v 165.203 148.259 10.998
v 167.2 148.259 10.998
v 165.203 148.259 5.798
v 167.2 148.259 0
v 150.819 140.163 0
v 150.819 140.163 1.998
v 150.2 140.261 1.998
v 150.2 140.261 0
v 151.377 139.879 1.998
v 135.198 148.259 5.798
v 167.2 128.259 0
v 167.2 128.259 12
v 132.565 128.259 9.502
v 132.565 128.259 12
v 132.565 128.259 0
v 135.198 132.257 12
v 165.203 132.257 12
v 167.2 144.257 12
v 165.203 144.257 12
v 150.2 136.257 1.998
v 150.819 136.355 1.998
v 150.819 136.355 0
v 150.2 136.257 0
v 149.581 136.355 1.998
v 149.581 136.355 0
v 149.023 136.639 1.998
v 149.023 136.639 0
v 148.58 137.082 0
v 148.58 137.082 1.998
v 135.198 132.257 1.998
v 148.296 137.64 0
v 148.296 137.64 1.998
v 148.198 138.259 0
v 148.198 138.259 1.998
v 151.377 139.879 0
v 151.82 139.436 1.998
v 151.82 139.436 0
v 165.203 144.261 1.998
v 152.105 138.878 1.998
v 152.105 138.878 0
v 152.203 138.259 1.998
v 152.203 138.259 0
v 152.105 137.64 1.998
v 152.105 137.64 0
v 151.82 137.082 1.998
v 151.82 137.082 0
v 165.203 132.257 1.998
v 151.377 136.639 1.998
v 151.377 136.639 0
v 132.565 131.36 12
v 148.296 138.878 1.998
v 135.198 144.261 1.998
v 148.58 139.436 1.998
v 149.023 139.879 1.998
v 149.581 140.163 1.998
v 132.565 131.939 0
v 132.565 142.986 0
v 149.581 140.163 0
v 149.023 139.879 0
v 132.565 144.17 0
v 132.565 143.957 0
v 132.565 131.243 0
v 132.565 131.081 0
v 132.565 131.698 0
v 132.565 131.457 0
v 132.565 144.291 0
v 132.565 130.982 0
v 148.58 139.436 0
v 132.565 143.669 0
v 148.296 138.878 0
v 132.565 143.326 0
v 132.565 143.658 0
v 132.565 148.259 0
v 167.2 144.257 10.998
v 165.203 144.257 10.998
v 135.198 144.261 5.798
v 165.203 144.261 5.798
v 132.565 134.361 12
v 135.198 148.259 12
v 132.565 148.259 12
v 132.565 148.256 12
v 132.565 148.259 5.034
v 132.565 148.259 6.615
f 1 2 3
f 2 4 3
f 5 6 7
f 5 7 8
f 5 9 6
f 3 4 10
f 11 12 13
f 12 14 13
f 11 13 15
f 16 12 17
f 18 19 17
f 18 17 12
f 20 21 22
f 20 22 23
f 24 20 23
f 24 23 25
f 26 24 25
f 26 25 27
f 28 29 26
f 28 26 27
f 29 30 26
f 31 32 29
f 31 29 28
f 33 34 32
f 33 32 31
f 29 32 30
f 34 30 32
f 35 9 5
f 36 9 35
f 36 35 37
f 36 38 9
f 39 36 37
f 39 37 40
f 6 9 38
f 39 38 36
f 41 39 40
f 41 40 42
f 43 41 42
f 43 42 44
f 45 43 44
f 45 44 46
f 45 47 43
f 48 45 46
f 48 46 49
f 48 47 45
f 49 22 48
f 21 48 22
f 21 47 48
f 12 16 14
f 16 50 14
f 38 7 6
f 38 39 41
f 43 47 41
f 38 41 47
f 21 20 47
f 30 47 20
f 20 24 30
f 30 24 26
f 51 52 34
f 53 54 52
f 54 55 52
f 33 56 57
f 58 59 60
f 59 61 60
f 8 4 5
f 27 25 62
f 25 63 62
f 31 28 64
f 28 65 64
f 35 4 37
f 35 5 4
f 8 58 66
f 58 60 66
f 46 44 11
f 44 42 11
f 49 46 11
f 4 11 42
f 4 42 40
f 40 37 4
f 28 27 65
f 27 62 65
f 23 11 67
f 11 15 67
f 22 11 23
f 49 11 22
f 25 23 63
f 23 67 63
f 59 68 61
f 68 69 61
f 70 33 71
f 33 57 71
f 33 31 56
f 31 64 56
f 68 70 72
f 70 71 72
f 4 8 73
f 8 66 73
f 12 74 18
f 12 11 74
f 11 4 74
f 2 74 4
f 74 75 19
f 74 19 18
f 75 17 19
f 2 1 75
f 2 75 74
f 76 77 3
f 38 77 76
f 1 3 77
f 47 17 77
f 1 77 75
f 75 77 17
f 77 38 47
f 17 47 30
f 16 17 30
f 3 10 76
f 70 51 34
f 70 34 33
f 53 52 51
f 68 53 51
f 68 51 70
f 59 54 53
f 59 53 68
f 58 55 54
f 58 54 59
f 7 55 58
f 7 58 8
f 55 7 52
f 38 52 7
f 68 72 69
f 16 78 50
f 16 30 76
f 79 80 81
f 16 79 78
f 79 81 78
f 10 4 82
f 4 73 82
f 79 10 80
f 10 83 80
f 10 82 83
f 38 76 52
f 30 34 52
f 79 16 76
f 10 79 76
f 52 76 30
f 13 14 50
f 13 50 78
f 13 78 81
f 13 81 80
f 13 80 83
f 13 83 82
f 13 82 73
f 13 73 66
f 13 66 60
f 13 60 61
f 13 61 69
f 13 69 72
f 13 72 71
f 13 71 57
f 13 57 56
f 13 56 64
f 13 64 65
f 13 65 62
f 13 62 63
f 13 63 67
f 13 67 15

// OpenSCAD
// Generated from geometric mesh data for hotbed_foot.stl.
// This file is self-contained and does not import or reference the source STL.
// Source mesh: 498 vertices, 166 triangular faces.

module hotbed_foot_v1() {
  polyhedron(
    points = [
      [165.20300293, 148.25900269, 10.9980011],
      [167.20001221, 148.25900269, 10.9980011],
      [165.20300293, 148.25900269, 5.79800034],
      [167.20001221, 148.25900269, 10.9980011],
      [167.20001221, 148.25900269, 0],
      [165.20300293, 148.25900269, 5.79800034],
      [150.81900024, 140.16299438, 0],
      [150.81900024, 140.16299438, 1.9980011],
      [150.20001221, 140.26100159, 1.9980011],
      [150.81900024, 140.16299438, 0],
      [150.20001221, 140.26100159, 1.9980011],
      [150.20001221, 140.26100159, 0],
      [150.81900024, 140.16299438, 0],
      [151.3769989, 139.8789978, 1.9980011],
      [150.81900024, 140.16299438, 1.9980011],
      [165.20300293, 148.25900269, 5.79800034],
      [167.20001221, 148.25900269, 0],
      [135.19799805, 148.25900269, 5.79800034],
      [167.20001221, 128.25900269, 0],
      [167.20001221, 128.25900269, 12],
      [132.5645752, 128.25900269, 9.50236511],
      [167.20001221, 128.25900269, 12],
      [132.5645752, 128.25900269, 12],
      [132.5645752, 128.25900269, 9.50236511],
      [167.20001221, 128.25900269, 0],
      [132.5645752, 128.25900269, 9.50236511],
      [132.5645752, 128.25900269, 0],
      [135.19799805, 132.25700378, 12],
      [167.20001221, 128.25900269, 12],
      [165.20300293, 132.25700378, 12],
      [167.20001221, 144.25700378, 12],
      [165.20300293, 144.25700378, 12],
      [165.20300293, 132.25700378, 12],
      [167.20001221, 144.25700378, 12],
      [165.20300293, 132.25700378, 12],
      [167.20001221, 128.25900269, 12],
      [150.20001221, 136.25700378, 1.9980011],
      [150.81900024, 136.35499573, 1.9980011],
      [150.81900024, 136.35499573, 0],
      [150.20001221, 136.25700378, 1.9980011],
      [150.81900024, 136.35499573, 0],
      [150.20001221, 136.25700378, 0],
      [149.58099365, 136.35499573, 1.9980011],
      [150.20001221, 136.25700378, 1.9980011],
      [150.20001221, 136.25700378, 0],
      [149.58099365, 136.35499573, 1.9980011],
      [150.20001221, 136.25700378, 0],
      [149.58099365, 136.35499573, 0],
      [149.022995, 136.63900757, 1.9980011],
      [149.58099365, 136.35499573, 1.9980011],
      [149.58099365, 136.35499573, 0],
      [149.022995, 136.63900757, 1.9980011],
      [149.58099365, 136.35499573, 0],
      [149.022995, 136.63900757, 0],
      [148.58000183, 137.08200073, 0],
      [148.58000183, 137.08200073, 1.9980011],
      [149.022995, 136.63900757, 1.9980011],
      [148.58000183, 137.08200073, 0],
      [149.022995, 136.63900757, 1.9980011],
      [149.022995, 136.63900757, 0],
      [148.58000183, 137.08200073, 1.9980011],
      [135.19799805, 132.25700378, 1.9980011],
      [149.022995, 136.63900757, 1.9980011],
      [148.29600525, 137.63999939, 0],
      [148.29600525, 137.63999939, 1.9980011],
      [148.58000183, 137.08200073, 1.9980011],
      [148.29600525, 137.63999939, 0],
      [148.58000183, 137.08200073, 1.9980011],
      [148.58000183, 137.08200073, 0],
      [148.19799805, 138.25900269, 0],
      [148.19799805, 138.25900269, 1.9980011],
      [148.29600525, 137.63999939, 1.9980011],
      [148.19799805, 138.25900269, 0],
      [148.29600525, 137.63999939, 1.9980011],
      [148.29600525, 137.63999939, 0],
      [148.58000183, 137.08200073, 1.9980011],
      [148.29600525, 137.63999939, 1.9980011],
      [135.19799805, 132.25700378, 1.9980011],
      [148.19799805, 138.25900269, 1.9980011],
      [135.19799805, 132.25700378, 1.9980011],
      [148.29600525, 137.63999939, 1.9980011],
      [151.3769989, 139.8789978, 0],
      [151.3769989, 139.8789978, 1.9980011],
      [150.81900024, 140.16299438, 0],
      [151.82000732, 139.43600464, 1.9980011],
      [151.3769989, 139.8789978, 1.9980011],
      [151.3769989, 139.8789978, 0],
      [151.82000732, 139.43600464, 1.9980011],
      [151.3769989, 139.8789978, 0],
      [151.82000732, 139.43600464, 0],
      [151.82000732, 139.43600464, 1.9980011],
      [165.20300293, 144.26100159, 1.9980011],
      [151.3769989, 139.8789978, 1.9980011],
      [152.10501099, 138.87799072, 1.9980011],
      [151.82000732, 139.43600464, 1.9980011],
      [151.82000732, 139.43600464, 0],
      [152.10501099, 138.87799072, 1.9980011],
      [151.82000732, 139.43600464, 0],
      [152.10501099, 138.87799072, 0],
      [150.81900024, 140.16299438, 1.9980011],
      [151.3769989, 139.8789978, 1.9980011],
      [165.20300293, 144.26100159, 1.9980011],
      [152.10501099, 138.87799072, 1.9980011],
      [165.20300293, 144.26100159, 1.9980011],
      [151.82000732, 139.43600464, 1.9980011],
      [152.20300293, 138.25900269, 1.9980011],
      [152.10501099, 138.87799072, 1.9980011],
      [152.10501099, 138.87799072, 0],
      [152.20300293, 138.25900269, 1.9980011],
      [152.10501099, 138.87799072, 0],
      [152.20300293, 138.25900269, 0],
      [152.10501099, 137.63999939, 1.9980011],
      [152.20300293, 138.25900269, 1.9980011],
      [152.20300293, 138.25900269, 0],
      [152.10501099, 137.63999939, 1.9980011],
      [152.20300293, 138.25900269, 0],
      [152.10501099, 137.63999939, 0],
      [151.82000732, 137.08200073, 1.9980011],
      [152.10501099, 137.63999939, 1.9980011],
      [152.10501099, 137.63999939, 0],
      [151.82000732, 137.08200073, 1.9980011],
      [152.10501099, 137.63999939, 0],
      [151.82000732, 137.08200073, 0],
      [151.82000732, 137.08200073, 1.9980011],
      [165.20300293, 132.25700378, 1.9980011],
      [152.10501099, 137.63999939, 1.9980011],
      [151.3769989, 136.63900757, 1.9980011],
      [151.82000732, 137.08200073, 1.9980011],
      [151.82000732, 137.08200073, 0],
      [151.3769989, 136.63900757, 1.9980011],
      [151.82000732, 137.08200073, 0],
      [151.3769989, 136.63900757, 0],
      [151.3769989, 136.63900757, 1.9980011],
      [165.20300293, 132.25700378, 1.9980011],
      [151.82000732, 137.08200073, 1.9980011],
      [151.3769989, 136.63900757, 0],
      [150.81900024, 136.35499573, 0],
      [151.3769989, 136.63900757, 1.9980011],
      [150.81900024, 136.35499573, 1.9980011],
      [151.3769989, 136.63900757, 1.9980011],
      [150.81900024, 136.35499573, 0],
      [150.81900024, 136.35499573, 1.9980011],
      [165.20300293, 132.25700378, 1.9980011],
      [151.3769989, 136.63900757, 1.9980011],
      [167.20001221, 128.25900269, 12],
      [135.19799805, 132.25700378, 12],
      [132.5645752, 128.25900269, 12],
      [135.19799805, 132.25700378, 12],
      [132.5645752, 131.35998535, 12],
      [132.5645752, 128.25900269, 12],
      [165.20300293, 144.26100159, 1.9980011],
      [150.20001221, 140.26100159, 1.9980011],
      [150.81900024, 140.16299438, 1.9980011],
      [165.20300293, 144.26100159, 1.9980011],
      [152.10501099, 138.87799072, 1.9980011],
      [152.20300293, 138.25900269, 1.9980011],
      [152.10501099, 137.63999939, 1.9980011],
      [165.20300293, 132.25700378, 1.9980011],
      [152.20300293, 138.25900269, 1.9980011],
      [165.20300293, 144.26100159, 1.9980011],
      [152.20300293, 138.25900269, 1.9980011],
      [165.20300293, 132.25700378, 1.9980011],
      [150.81900024, 136.35499573, 1.9980011],
      [150.20001221, 136.25700378, 1.9980011],
      [165.20300293, 132.25700378, 1.9980011],
      [135.19799805, 132.25700378, 1.9980011],
      [165.20300293, 132.25700378, 1.9980011],
      [150.20001221, 136.25700378, 1.9980011],
      [150.20001221, 136.25700378, 1.9980011],
      [149.58099365, 136.35499573, 1.9980011],
      [135.19799805, 132.25700378, 1.9980011],
      [135.19799805, 132.25700378, 1.9980011],
      [149.58099365, 136.35499573, 1.9980011],
      [149.022995, 136.63900757, 1.9980011],
      [148.29600525, 138.87799072, 1.9980011],
      [135.19799805, 144.26100159, 1.9980011],
      [148.19799805, 138.25900269, 1.9980011],
      [148.58000183, 139.43600464, 1.9980011],
      [149.022995, 139.8789978, 1.9980011],
      [135.19799805, 144.26100159, 1.9980011],
      [149.022995, 139.8789978, 1.9980011],
      [149.58099365, 140.16299438, 1.9980011],
      [135.19799805, 144.26100159, 1.9980011],
      [148.19799805, 138.25900269, 0],
      [132.5645752, 131.93917847, 0],
      [132.5645752, 142.98579407, 0],
      [149.58099365, 140.16299438, 0],
      [149.022995, 139.8789978, 0],
      [132.5645752, 144.17001343, 0],
      [149.022995, 139.8789978, 0],
      [132.5645752, 143.95674133, 0],
      [132.5645752, 144.17001343, 0],
      [150.20001221, 140.26100159, 0],
      [167.20001221, 148.25900269, 0],
      [150.81900024, 140.16299438, 0],
      [149.022995, 136.63900757, 0],
      [149.58099365, 136.35499573, 0],
      [132.5645752, 131.24345398, 0],
      [149.58099365, 136.35499573, 0],
      [132.5645752, 131.08071899, 0],
      [132.5645752, 131.24345398, 0],
      [148.29600525, 137.63999939, 0],
      [148.58000183, 137.08200073, 0],
      [132.5645752, 131.69775391, 0],
      [148.58000183, 137.08200073, 0],
      [132.5645752, 131.45663452, 0],
      [132.5645752, 131.69775391, 0],
      [151.3769989, 139.8789978, 0],
      [167.20001221, 148.25900269, 0],
      [151.82000732, 139.43600464, 0],
      [151.3769989, 139.8789978, 0],
      [150.81900024, 140.16299438, 0],
      [167.20001221, 148.25900269, 0],
      [150.20001221, 140.26100159, 0],
      [149.58099365, 140.16299438, 0],
      [132.5645752, 144.29093933, 0],
      [149.58099365, 140.16299438, 0],
      [132.5645752, 144.17001343, 0],
      [132.5645752, 144.29093933, 0],
      [151.82000732, 137.08200073, 0],
      [152.10501099, 137.63999939, 0],
      [167.20001221, 128.25900269, 0],
      [152.10501099, 137.63999939, 0],
      [152.20300293, 138.25900269, 0],
      [167.20001221, 128.25900269, 0],
      [151.3769989, 136.63900757, 0],
      [151.82000732, 137.08200073, 0],
      [167.20001221, 128.25900269, 0],
      [167.20001221, 148.25900269, 0],
      [167.20001221, 128.25900269, 0],
      [152.20300293, 138.25900269, 0],
      [167.20001221, 148.25900269, 0],
      [152.20300293, 138.25900269, 0],
      [152.10501099, 138.87799072, 0],
      [152.10501099, 138.87799072, 0],
      [151.82000732, 139.43600464, 0],
      [167.20001221, 148.25900269, 0],
      [148.58000183, 137.08200073, 0],
      [149.022995, 136.63900757, 0],
      [132.5645752, 131.45663452, 0],
      [149.022995, 136.63900757, 0],
      [132.5645752, 131.24345398, 0],
      [132.5645752, 131.45663452, 0],
      [150.20001221, 136.25700378, 0],
      [167.20001221, 128.25900269, 0],
      [132.5645752, 130.98202515, 0],
      [167.20001221, 128.25900269, 0],
      [132.5645752, 128.25900269, 0],
      [132.5645752, 130.98202515, 0],
      [150.81900024, 136.35499573, 0],
      [167.20001221, 128.25900269, 0],
      [150.20001221, 136.25700378, 0],
      [151.3769989, 136.63900757, 0],
      [167.20001221, 128.25900269, 0],
      [150.81900024, 136.35499573, 0],
      [149.58099365, 136.35499573, 0],
      [150.20001221, 136.25700378, 0],
      [132.5645752, 131.08071899, 0],
      [150.20001221, 136.25700378, 0],
      [132.5645752, 130.98202515, 0],
      [132.5645752, 131.08071899, 0],
      [149.022995, 139.8789978, 0],
      [148.58000183, 139.43600464, 0],
      [132.5645752, 143.95674133, 0],
      [148.58000183, 139.43600464, 0],
      [132.5645752, 143.66918945, 0],
      [132.5645752, 143.95674133, 0],
      [148.29600525, 138.87799072, 0],
      [148.19799805, 138.25900269, 0],
      [132.5645752, 143.32611084, 0],
      [148.19799805, 138.25900269, 0],
      [132.5645752, 142.98579407, 0],
      [132.5645752, 143.32611084, 0],
      [148.19799805, 138.25900269, 0],
      [148.29600525, 137.63999939, 0],
      [132.5645752, 131.93917847, 0],
      [148.29600525, 137.63999939, 0],
      [132.5645752, 131.69775391, 0],
      [132.5645752, 131.93917847, 0],
      [148.58000183, 139.43600464, 0],
      [148.29600525, 138.87799072, 0],
      [132.5645752, 143.65815735, 0],
      [148.29600525, 138.87799072, 0],
      [132.5645752, 143.32611084, 0],
      [132.5645752, 143.65815735, 0],
      [167.20001221, 148.25900269, 0],
      [150.20001221, 140.26100159, 0],
      [132.5645752, 148.25900269, 0],
      [150.20001221, 140.26100159, 0],
      [132.5645752, 144.29093933, 0],
      [132.5645752, 148.25900269, 0],
      [167.20001221, 128.25900269, 12],
      [167.20001221, 144.25700378, 10.9980011],
      [167.20001221, 144.25700378, 12],
      [167.20001221, 128.25900269, 12],
      [167.20001221, 128.25900269, 0],
      [167.20001221, 144.25700378, 10.9980011],
      [167.20001221, 128.25900269, 0],
      [167.20001221, 148.25900269, 0],
      [167.20001221, 144.25700378, 10.9980011],
      [167.20001221, 148.25900269, 10.9980011],
      [167.20001221, 144.25700378, 10.9980011],
      [167.20001221, 148.25900269, 0],
      [167.20001221, 144.25700378, 10.9980011],
      [165.20300293, 144.25700378, 10.9980011],
      [165.20300293, 144.25700378, 12],
      [167.20001221, 144.25700378, 10.9980011],
      [165.20300293, 144.25700378, 12],
      [167.20001221, 144.25700378, 12],
      [165.20300293, 144.25700378, 10.9980011],
      [165.20300293, 132.25700378, 12],
      [165.20300293, 144.25700378, 12],
      [167.20001221, 148.25900269, 10.9980011],
      [165.20300293, 148.25900269, 10.9980011],
      [165.20300293, 144.25700378, 10.9980011],
      [167.20001221, 148.25900269, 10.9980011],
      [165.20300293, 144.25700378, 10.9980011],
      [167.20001221, 144.25700378, 10.9980011],
      [135.19799805, 144.26100159, 5.79800034],
      [165.20300293, 144.26100159, 5.79800034],
      [165.20300293, 148.25900269, 5.79800034],
      [165.20300293, 144.26100159, 1.9980011],
      [165.20300293, 144.26100159, 5.79800034],
      [135.19799805, 144.26100159, 5.79800034],
      [165.20300293, 148.25900269, 10.9980011],
      [165.20300293, 148.25900269, 5.79800034],
      [165.20300293, 144.26100159, 5.79800034],
      [165.20300293, 132.25700378, 1.9980011],
      [165.20300293, 132.25700378, 12],
      [165.20300293, 144.26100159, 5.79800034],
      [165.20300293, 148.25900269, 10.9980011],
      [165.20300293, 144.26100159, 5.79800034],
      [165.20300293, 144.25700378, 10.9980011],
      [165.20300293, 144.25700378, 10.9980011],
      [165.20300293, 144.26100159, 5.79800034],
      [165.20300293, 132.25700378, 12],
      [165.20300293, 144.26100159, 5.79800034],
      [165.20300293, 144.26100159, 1.9980011],
      [165.20300293, 132.25700378, 1.9980011],
      [165.20300293, 132.25700378, 12],
      [165.20300293, 132.25700378, 1.9980011],
      [135.19799805, 132.25700378, 1.9980011],
      [135.19799805, 132.25700378, 12],
      [165.20300293, 132.25700378, 12],
      [135.19799805, 132.25700378, 1.9980011],
      [165.20300293, 148.25900269, 5.79800034],
      [135.19799805, 148.25900269, 5.79800034],
      [135.19799805, 144.26100159, 5.79800034],
      [148.29600525, 138.87799072, 0],
      [148.29600525, 138.87799072, 1.9980011],
      [148.19799805, 138.25900269, 1.9980011],
      [148.29600525, 138.87799072, 0],
      [148.19799805, 138.25900269, 1.9980011],
      [148.19799805, 138.25900269, 0],
      [148.58000183, 139.43600464, 1.9980011],
      [135.19799805, 144.26100159, 1.9980011],
      [148.29600525, 138.87799072, 1.9980011],
      [148.58000183, 139.43600464, 0],
      [148.58000183, 139.43600464, 1.9980011],
      [148.29600525, 138.87799072, 1.9980011],
      [148.58000183, 139.43600464, 0],
      [148.29600525, 138.87799072, 1.9980011],
      [148.29600525, 138.87799072, 0],
      [149.022995, 139.8789978, 0],
      [149.022995, 139.8789978, 1.9980011],
      [148.58000183, 139.43600464, 1.9980011],
      [149.022995, 139.8789978, 0],
      [148.58000183, 139.43600464, 1.9980011],
      [148.58000183, 139.43600464, 0],
      [149.58099365, 140.16299438, 0],
      [149.58099365, 140.16299438, 1.9980011],
      [149.022995, 139.8789978, 1.9980011],
      [149.58099365, 140.16299438, 0],
      [149.022995, 139.8789978, 1.9980011],
      [149.022995, 139.8789978, 0],
      [150.20001221, 140.26100159, 1.9980011],
      [149.58099365, 140.16299438, 1.9980011],
      [149.58099365, 140.16299438, 0],
      [150.20001221, 140.26100159, 1.9980011],
      [149.58099365, 140.16299438, 0],
      [150.20001221, 140.26100159, 0],
      [149.58099365, 140.16299438, 1.9980011],
      [150.20001221, 140.26100159, 1.9980011],
      [135.19799805, 144.26100159, 1.9980011],
      [165.20300293, 144.26100159, 1.9980011],
      [135.19799805, 144.26100159, 1.9980011],
      [150.20001221, 140.26100159, 1.9980011],
      [148.58000183, 139.43600464, 0],
      [132.5645752, 143.65815735, 0],
      [132.5645752, 143.66918945, 0],
      [135.19799805, 132.25700378, 12],
      [132.5645752, 134.36117554, 12],
      [132.5645752, 131.35998535, 12],
      [135.19799805, 132.25700378, 12],
      [135.19799805, 132.25700378, 1.9980011],
      [135.19799805, 144.26100159, 5.79800034],
      [135.19799805, 148.25900269, 12],
      [132.5645752, 148.25900269, 12],
      [132.5645752, 148.25596619, 12],
      [135.19799805, 132.25700378, 12],
      [135.19799805, 148.25900269, 12],
      [132.5645752, 134.36117554, 12],
      [135.19799805, 148.25900269, 12],
      [132.5645752, 148.25596619, 12],
      [132.5645752, 134.36117554, 12],
      [135.19799805, 148.25900269, 5.79800034],
      [167.20001221, 148.25900269, 0],
      [132.5645752, 148.25900269, 5.03449249],
      [167.20001221, 148.25900269, 0],
      [132.5645752, 148.25900269, 0],
      [132.5645752, 148.25900269, 5.03449249],
      [135.19799805, 148.25900269, 12],
      [135.19799805, 148.25900269, 5.79800034],
      [132.5645752, 148.25900269, 12],
      [135.19799805, 148.25900269, 5.79800034],
      [132.5645752, 148.25900269, 6.61470413],
      [132.5645752, 148.25900269, 12],
      [135.19799805, 148.25900269, 5.79800034],
      [132.5645752, 148.25900269, 5.03449249],
      [132.5645752, 148.25900269, 6.61470413],
      [165.20300293, 144.26100159, 1.9980011],
      [135.19799805, 144.26100159, 5.79800034],
      [135.19799805, 144.26100159, 1.9980011],
      [135.19799805, 132.25700378, 1.9980011],
      [148.19799805, 138.25900269, 1.9980011],
      [135.19799805, 144.26100159, 1.9980011],
      [135.19799805, 148.25900269, 12],
      [135.19799805, 132.25700378, 12],
      [135.19799805, 144.26100159, 5.79800034],
      [135.19799805, 148.25900269, 5.79800034],
      [135.19799805, 148.25900269, 12],
      [135.19799805, 144.26100159, 5.79800034],
      [135.19799805, 144.26100159, 1.9980011],
      [135.19799805, 144.26100159, 5.79800034],
      [135.19799805, 132.25700378, 1.9980011],
      [132.5645752, 128.25900269, 9.50236511],
      [132.5645752, 128.25900269, 12],
      [132.5645752, 131.35998535, 12],
      [132.5645752, 128.25900269, 9.50236511],
      [132.5645752, 131.35998535, 12],
      [132.5645752, 134.36117554, 12],
      [132.5645752, 128.25900269, 9.50236511],
      [132.5645752, 134.36117554, 12],
      [132.5645752, 148.25596619, 12],
      [132.5645752, 128.25900269, 9.50236511],
      [132.5645752, 148.25596619, 12],
      [132.5645752, 148.25900269, 12],
      [132.5645752, 128.25900269, 9.50236511],
      [132.5645752, 148.25900269, 12],
      [132.5645752, 148.25900269, 6.61470413],
      [132.5645752, 128.25900269, 9.50236511],
      [132.5645752, 148.25900269, 6.61470413],
      [132.5645752, 148.25900269, 5.03449249],
      [132.5645752, 128.25900269, 9.50236511],
      [132.5645752, 148.25900269, 5.03449249],
      [132.5645752, 148.25900269, 0],
      [132.5645752, 128.25900269, 9.50236511],
      [132.5645752, 148.25900269, 0],
      [132.5645752, 144.29093933, 0],
      [132.5645752, 128.25900269, 9.50236511],
      [132.5645752, 144.29093933, 0],
      [132.5645752, 144.17001343, 0],
      [132.5645752, 128.25900269, 9.50236511],
      [132.5645752, 144.17001343, 0],
      [132.5645752, 143.95674133, 0],
      [132.5645752, 128.25900269, 9.50236511],
      [132.5645752, 143.95674133, 0],
      [132.5645752, 143.66918945, 0],
      [132.5645752, 128.25900269, 9.50236511],
      [132.5645752, 143.66918945, 0],
      [132.5645752, 143.65815735, 0],
      [132.5645752, 128.25900269, 9.50236511],
      [132.5645752, 143.65815735, 0],
      [132.5645752, 143.32611084, 0],
      [132.5645752, 128.25900269, 9.50236511],
      [132.5645752, 143.32611084, 0],
      [132.5645752, 142.98579407, 0],
      [132.5645752, 128.25900269, 9.50236511],
      [132.5645752, 142.98579407, 0],
      [132.5645752, 131.93917847, 0],
      [132.5645752, 128.25900269, 9.50236511],
      [132.5645752, 131.93917847, 0],
      [132.5645752, 131.69775391, 0],
      [132.5645752, 128.25900269, 9.50236511],
      [132.5645752, 131.69775391, 0],
      [132.5645752, 131.45663452, 0],
      [132.5645752, 128.25900269, 9.50236511],
      [132.5645752, 131.45663452, 0],
      [132.5645752, 131.24345398, 0],
      [132.5645752, 128.25900269, 9.50236511],
      [132.5645752, 131.24345398, 0],
      [132.5645752, 131.08071899, 0],
      [132.5645752, 128.25900269, 9.50236511],
      [132.5645752, 131.08071899, 0],
      [132.5645752, 130.98202515, 0],
      [132.5645752, 128.25900269, 9.50236511],
      [132.5645752, 130.98202515, 0],
      [132.5645752, 128.25900269, 0],
    ],
    faces = [
      [2, 1, 0],
      [5, 4, 3],
      [8, 7, 6],
      [11, 10, 9],
      [14, 13, 12],
      [17, 16, 15],
      [20, 19, 18],
      [23, 22, 21],
      [26, 25, 24],
      [29, 28, 27],
      [32, 31, 30],
      [35, 34, 33],
      [38, 37, 36],
      [41, 40, 39],
      [44, 43, 42],
      [47, 46, 45],
      [50, 49, 48],
      [53, 52, 51],
      [56, 55, 54],
      [59, 58, 57],
      [62, 61, 60],
      [65, 64, 63],
      [68, 67, 66],
      [71, 70, 69],
      [74, 73, 72],
      [77, 76, 75],
      [80, 79, 78],
      [83, 82, 81],
      [86, 85, 84],
      [89, 88, 87],
      [92, 91, 90],
      [95, 94, 93],
      [98, 97, 96],
      [101, 100, 99],
      [104, 103, 102],
      [107, 106, 105],
      [110, 109, 108],
      [113, 112, 111],
      [116, 115, 114],
      [119, 118, 117],
      [122, 121, 120],
      [125, 124, 123],
      [128, 127, 126],
      [131, 130, 129],
      [134, 133, 132],
      [137, 136, 135],
      [140, 139, 138],
      [143, 142, 141],
      [146, 145, 144],
      [149, 148, 147],
      [152, 151, 150],
      [155, 154, 153],
      [158, 157, 156],
      [161, 160, 159],
      [164, 163, 162],
      [167, 166, 165],
      [170, 169, 168],
      [173, 172, 171],
      [176, 175, 174],
      [179, 178, 177],
      [182, 181, 180],
      [185, 184, 183],
      [188, 187, 186],
      [191, 190, 189],
      [194, 193, 192],
      [197, 196, 195],
      [200, 199, 198],
      [203, 202, 201],
      [206, 205, 204],
      [209, 208, 207],
      [212, 211, 210],
      [215, 214, 213],
      [218, 217, 216],
      [221, 220, 219],
      [224, 223, 222],
      [227, 226, 225],
      [230, 229, 228],
      [233, 232, 231],
      [236, 235, 234],
      [239, 238, 237],
      [242, 241, 240],
      [245, 244, 243],
      [248, 247, 246],
      [251, 250, 249],
      [254, 253, 252],
      [257, 256, 255],
      [260, 259, 258],
      [263, 262, 261],
      [266, 265, 264],
      [269, 268, 267],
      [272, 271, 270],
      [275, 274, 273],
      [278, 277, 276],
      [281, 280, 279],
      [284, 283, 282],
      [287, 286, 285],
      [290, 289, 288],
      [293, 292, 291],
      [296, 295, 294],
      [299, 298, 297],
      [302, 301, 300],
      [305, 304, 303],
      [308, 307, 306],
      [311, 310, 309],
      [314, 313, 312],
      [317, 316, 315],
      [320, 319, 318],
      [323, 322, 321],
      [326, 325, 324],
      [329, 328, 327],
      [332, 331, 330],
      [335, 334, 333],
      [338, 337, 336],
      [341, 340, 339],
      [344, 343, 342],
      [347, 346, 345],
      [350, 349, 348],
      [353, 352, 351],
      [356, 355, 354],
      [359, 358, 357],
      [362, 361, 360],
      [365, 364, 363],
      [368, 367, 366],
      [371, 370, 369],
      [374, 373, 372],
      [377, 376, 375],
      [380, 379, 378],
      [383, 382, 381],
      [386, 385, 384],
      [389, 388, 387],
      [392, 391, 390],
      [395, 394, 393],
      [398, 397, 396],
      [401, 400, 399],
      [404, 403, 402],
      [407, 406, 405],
      [410, 409, 408],
      [413, 412, 411],
      [416, 415, 414],
      [419, 418, 417],
      [422, 421, 420],
      [425, 424, 423],
      [428, 427, 426],
      [431, 430, 429],
      [434, 433, 432],
      [437, 436, 435],
      [440, 439, 438],
      [443, 442, 441],
      [446, 445, 444],
      [449, 448, 447],
      [452, 451, 450],
      [455, 454, 453],
      [458, 457, 456],
      [461, 460, 459],
      [464, 463, 462],
      [467, 466, 465],
      [470, 469, 468],
      [473, 472, 471],
      [476, 475, 474],
      [479, 478, 477],
      [482, 481, 480],
      [485, 484, 483],
      [488, 487, 486],
      [491, 490, 489],
      [494, 493, 492],
      [497, 496, 495],
    ],
    convexity = 10
  );
}

hotbed_foot_v1();
